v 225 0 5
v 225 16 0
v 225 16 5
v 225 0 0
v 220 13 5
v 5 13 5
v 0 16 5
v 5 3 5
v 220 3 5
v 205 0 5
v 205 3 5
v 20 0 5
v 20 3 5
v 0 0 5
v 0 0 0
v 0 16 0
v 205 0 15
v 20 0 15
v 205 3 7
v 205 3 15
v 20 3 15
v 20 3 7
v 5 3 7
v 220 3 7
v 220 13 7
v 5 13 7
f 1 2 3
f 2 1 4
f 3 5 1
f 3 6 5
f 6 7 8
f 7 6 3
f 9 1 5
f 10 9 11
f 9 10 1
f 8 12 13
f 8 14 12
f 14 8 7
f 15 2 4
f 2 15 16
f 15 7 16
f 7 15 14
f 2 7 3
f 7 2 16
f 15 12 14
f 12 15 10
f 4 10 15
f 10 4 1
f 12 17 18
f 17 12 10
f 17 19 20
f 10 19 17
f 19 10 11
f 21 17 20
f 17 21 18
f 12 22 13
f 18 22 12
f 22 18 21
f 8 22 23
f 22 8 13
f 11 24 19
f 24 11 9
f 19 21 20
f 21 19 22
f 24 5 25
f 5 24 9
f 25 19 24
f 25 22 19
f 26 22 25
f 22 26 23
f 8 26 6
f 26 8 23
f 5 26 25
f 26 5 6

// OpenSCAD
union(){
    cube([225,16,5]);
    translate([20,0,5]){
        cube([185,3,10]);
    }
    translate([5,3,5]){
        cube([215,10,2]);
    }
}
